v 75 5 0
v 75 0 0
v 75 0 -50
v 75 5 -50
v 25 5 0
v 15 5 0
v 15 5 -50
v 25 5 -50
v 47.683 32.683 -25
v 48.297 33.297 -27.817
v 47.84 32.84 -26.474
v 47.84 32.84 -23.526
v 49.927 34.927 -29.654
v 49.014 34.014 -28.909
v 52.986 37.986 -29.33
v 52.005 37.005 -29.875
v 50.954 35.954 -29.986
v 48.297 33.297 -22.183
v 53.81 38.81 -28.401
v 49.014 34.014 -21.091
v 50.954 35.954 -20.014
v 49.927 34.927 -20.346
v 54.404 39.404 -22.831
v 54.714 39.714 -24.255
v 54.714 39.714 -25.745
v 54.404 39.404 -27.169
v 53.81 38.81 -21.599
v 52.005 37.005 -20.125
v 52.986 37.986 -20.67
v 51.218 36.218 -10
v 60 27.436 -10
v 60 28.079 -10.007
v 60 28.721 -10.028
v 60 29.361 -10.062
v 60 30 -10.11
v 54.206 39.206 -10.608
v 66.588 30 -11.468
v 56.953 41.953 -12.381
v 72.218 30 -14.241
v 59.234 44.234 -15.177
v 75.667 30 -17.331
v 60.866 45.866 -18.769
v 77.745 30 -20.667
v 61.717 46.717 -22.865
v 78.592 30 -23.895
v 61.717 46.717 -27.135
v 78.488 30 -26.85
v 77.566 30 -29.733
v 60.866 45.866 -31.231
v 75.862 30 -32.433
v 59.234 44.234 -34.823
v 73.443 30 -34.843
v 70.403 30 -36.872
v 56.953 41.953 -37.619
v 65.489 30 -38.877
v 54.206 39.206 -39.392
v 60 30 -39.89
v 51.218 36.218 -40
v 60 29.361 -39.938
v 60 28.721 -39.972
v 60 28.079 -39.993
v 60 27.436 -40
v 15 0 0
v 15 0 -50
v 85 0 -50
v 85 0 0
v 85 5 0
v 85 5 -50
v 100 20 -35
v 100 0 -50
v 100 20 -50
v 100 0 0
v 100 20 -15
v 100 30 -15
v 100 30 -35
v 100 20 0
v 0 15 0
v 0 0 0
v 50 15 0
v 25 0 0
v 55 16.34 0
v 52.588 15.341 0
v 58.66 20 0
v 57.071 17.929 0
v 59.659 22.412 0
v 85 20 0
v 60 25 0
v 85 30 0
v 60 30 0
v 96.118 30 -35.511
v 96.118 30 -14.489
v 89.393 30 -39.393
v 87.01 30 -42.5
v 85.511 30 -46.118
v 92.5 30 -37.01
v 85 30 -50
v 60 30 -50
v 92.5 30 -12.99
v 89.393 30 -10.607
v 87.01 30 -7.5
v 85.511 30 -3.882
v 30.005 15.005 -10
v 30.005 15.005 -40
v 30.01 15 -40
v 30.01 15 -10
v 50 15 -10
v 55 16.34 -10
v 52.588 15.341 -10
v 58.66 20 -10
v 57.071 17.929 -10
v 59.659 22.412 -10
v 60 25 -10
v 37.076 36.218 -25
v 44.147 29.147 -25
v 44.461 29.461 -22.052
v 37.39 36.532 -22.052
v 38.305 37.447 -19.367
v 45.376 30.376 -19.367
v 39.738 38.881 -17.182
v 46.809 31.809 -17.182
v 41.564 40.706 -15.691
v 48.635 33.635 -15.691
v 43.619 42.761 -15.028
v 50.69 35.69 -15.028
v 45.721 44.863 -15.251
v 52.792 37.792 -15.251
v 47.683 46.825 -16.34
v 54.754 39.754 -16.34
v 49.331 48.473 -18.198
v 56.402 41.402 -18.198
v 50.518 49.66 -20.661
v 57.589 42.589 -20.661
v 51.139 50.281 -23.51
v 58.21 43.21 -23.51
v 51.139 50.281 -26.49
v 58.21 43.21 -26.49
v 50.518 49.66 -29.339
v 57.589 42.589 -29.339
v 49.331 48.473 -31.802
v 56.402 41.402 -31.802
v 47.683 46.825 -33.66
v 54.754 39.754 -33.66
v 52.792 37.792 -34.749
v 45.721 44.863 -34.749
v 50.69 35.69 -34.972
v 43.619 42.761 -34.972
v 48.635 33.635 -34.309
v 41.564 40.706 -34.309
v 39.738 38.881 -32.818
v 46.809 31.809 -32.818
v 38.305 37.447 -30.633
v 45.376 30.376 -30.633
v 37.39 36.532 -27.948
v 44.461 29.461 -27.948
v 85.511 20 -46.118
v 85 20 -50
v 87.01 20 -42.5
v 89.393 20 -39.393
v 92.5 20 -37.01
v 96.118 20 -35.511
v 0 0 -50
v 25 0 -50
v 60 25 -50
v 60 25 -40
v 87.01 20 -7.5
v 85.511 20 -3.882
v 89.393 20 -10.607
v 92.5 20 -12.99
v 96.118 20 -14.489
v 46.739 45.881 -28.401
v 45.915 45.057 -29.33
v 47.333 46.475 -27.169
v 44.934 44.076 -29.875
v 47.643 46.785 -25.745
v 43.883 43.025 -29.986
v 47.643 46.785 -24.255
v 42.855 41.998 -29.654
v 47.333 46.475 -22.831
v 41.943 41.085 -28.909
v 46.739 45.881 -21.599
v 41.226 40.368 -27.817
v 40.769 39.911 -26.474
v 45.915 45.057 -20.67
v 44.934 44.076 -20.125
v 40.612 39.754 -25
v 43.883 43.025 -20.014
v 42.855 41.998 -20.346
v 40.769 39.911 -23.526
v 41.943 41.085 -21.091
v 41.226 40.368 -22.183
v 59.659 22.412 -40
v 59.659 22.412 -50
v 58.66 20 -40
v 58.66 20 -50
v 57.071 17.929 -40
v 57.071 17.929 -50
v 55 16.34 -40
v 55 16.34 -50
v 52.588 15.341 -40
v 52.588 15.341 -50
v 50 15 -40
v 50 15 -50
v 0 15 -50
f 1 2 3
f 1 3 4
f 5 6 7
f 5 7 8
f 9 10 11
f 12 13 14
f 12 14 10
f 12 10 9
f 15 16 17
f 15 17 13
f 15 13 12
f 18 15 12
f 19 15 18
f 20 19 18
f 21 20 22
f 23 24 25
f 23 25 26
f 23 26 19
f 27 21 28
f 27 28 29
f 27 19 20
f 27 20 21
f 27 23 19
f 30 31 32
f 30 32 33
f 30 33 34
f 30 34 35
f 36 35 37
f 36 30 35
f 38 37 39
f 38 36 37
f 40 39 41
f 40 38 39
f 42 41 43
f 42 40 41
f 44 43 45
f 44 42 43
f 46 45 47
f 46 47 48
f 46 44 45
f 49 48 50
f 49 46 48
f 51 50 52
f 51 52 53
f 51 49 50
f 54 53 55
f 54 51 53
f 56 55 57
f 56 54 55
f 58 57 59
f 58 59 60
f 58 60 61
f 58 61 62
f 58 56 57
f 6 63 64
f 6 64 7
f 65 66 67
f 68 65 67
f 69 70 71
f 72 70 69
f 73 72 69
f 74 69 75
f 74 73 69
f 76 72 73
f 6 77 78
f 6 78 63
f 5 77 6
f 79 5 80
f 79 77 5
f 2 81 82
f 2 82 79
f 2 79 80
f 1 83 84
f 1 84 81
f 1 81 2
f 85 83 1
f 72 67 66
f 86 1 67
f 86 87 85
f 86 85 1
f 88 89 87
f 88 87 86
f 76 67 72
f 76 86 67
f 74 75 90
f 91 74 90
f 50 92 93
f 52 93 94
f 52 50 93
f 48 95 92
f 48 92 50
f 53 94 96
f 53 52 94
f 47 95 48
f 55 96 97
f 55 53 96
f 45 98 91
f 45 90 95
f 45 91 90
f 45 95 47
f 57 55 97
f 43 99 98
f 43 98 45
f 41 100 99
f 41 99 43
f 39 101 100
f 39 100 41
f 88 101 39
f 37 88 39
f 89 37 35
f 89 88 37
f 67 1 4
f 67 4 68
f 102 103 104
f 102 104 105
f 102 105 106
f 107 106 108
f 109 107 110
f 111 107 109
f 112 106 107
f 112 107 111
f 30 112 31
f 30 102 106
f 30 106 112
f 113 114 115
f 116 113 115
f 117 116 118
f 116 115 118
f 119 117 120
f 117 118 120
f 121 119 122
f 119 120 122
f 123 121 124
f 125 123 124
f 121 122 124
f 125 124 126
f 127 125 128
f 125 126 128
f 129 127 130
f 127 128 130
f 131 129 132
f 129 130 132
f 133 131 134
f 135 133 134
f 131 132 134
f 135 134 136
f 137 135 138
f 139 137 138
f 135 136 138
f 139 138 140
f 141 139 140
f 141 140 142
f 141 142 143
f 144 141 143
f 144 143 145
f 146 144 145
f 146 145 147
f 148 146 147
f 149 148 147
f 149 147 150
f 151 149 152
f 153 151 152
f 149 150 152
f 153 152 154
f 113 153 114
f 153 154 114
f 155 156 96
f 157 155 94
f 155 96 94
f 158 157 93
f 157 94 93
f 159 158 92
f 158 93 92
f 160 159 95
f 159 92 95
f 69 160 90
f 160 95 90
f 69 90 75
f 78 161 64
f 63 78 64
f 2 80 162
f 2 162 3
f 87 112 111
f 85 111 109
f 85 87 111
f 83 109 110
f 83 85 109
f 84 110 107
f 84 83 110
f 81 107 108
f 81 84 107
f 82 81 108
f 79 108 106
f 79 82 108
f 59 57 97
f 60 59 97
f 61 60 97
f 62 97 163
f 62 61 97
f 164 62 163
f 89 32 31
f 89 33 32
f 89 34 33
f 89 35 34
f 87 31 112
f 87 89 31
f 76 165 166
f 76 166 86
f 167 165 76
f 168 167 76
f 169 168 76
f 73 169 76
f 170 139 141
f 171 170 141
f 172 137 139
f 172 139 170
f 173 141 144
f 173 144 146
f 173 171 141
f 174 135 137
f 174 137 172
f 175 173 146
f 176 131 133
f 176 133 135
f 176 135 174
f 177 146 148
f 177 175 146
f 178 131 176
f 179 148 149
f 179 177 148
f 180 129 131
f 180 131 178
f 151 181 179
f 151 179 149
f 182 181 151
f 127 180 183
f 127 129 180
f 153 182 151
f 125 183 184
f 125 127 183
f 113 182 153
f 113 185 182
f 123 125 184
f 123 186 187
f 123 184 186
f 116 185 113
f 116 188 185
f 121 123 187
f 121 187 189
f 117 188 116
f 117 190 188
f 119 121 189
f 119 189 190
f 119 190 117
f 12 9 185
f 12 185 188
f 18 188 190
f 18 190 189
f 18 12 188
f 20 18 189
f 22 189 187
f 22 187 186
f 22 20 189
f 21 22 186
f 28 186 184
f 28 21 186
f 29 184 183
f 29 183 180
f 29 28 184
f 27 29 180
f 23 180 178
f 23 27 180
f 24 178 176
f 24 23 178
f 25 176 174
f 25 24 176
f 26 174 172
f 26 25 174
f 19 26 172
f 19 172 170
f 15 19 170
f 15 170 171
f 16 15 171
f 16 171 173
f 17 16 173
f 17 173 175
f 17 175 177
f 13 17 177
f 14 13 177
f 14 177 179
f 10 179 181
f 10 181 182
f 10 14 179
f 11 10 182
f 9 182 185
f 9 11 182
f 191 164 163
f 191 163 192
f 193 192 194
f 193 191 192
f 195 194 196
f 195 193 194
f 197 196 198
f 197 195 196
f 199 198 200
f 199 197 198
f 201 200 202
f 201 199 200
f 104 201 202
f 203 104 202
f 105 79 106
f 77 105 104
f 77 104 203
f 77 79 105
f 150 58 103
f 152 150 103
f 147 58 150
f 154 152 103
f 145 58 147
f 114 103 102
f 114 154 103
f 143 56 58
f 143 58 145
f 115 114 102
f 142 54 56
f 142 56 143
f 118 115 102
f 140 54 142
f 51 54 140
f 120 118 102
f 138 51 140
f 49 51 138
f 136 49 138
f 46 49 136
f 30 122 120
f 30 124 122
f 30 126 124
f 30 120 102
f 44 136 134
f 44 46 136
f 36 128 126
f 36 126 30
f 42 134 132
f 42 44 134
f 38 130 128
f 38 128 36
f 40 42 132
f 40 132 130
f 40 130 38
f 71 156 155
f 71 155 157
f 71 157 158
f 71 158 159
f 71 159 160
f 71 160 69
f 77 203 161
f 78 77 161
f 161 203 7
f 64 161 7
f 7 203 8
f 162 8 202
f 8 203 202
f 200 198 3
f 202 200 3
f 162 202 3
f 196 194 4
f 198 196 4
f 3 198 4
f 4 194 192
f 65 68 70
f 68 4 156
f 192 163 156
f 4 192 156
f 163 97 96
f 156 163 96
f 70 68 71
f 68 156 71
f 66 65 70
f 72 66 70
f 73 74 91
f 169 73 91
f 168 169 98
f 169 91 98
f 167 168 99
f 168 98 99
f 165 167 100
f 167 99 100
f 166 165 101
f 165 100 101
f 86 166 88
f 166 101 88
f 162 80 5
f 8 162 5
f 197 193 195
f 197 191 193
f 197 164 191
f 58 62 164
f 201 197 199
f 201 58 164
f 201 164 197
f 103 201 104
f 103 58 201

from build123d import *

# Parameters (mm, degrees)
BOSS_EXTRUDE1_DEPTH = 50
BOSS_EXTRUDE2_REACH = 113.636
SKETCH2_W           = 30
SKETCH2_H           = 14.135098559
SKETCH3_R           = 10
SKETCH3_R_2         = 5
BOSS_EXTRUDE3_DEPTH = 10
SKETCH4_R           = 15
CUT_EXTRUDE1_DEPTH  = 10
SKETCH5_W           = 10
SKETCH5_H           = 5
CUT_EXTRUDE2_DEPTH  = 123.622026278


with BuildPart() as part:
    # Sketch1 → Boss-Extrude1 (new body)
    with BuildSketch(Plane.XY):
        with BuildLine():
            Line((0, 0), (100, 0))
            Line((100, 0), (100, 30))
            Line((100, 30), (60, 30))
            Line((60, 30), (60, 25))
            ThreePointArc((60, 25), (57.071067812, 17.928932188), (50, 15))
            Line((50, 15), (0, 15))
            Line((0, 15), (0, 0))
        make_face()
    extrude(amount=-BOSS_EXTRUDE1_DEPTH)

    # Boss-Extrude2: up to this plane
    boss_extrude2_end = Plane(origin=(50, 15, -50), z_dir=(0, 1, 0))
    # Sketch2 → Boss-Extrude2 (add, up to the surface)
    with BuildSketch(Plane(origin=(7.5, -7.5, 0), x_dir=(0, 0, 1), z_dir=(-0.7071067811865489, 0.7071067811865462, 0)), mode=Mode.PRIVATE) as boss_extrude2_sk1:
        with Locations((-25, 38.894391498)):
            Rectangle(SKETCH2_W, SKETCH2_H)
    boss_extrude2_tool1 = split(extrude(boss_extrude2_sk1.sketch, amount=-BOSS_EXTRUDE2_REACH, mode=Mode.PRIVATE), bisect_by=boss_extrude2_end, keep=Keep.BOTH, mode=Mode.PRIVATE)
    add(boss_extrude2_tool1.solids().sort_by_distance((35.002488, 20.002488, -25))[0])
    # Sketch2 → Boss-Extrude2 (add, up to the surface)
    with BuildSketch(Plane(origin=(7.5, -7.5, 0), x_dir=(0, 0, 1), z_dir=(-0.7071067811865489, 0.7071067811865462, 0)), mode=Mode.PRIVATE) as boss_extrude2_sk2:
        with BuildLine():
            Line((-40, 61.826842218), (-40, 45.961940777))
            Line((-40, 45.961940777), (-10, 45.961940777))
            Line((-10, 45.961940777), (-10, 61.826842218))
            ThreePointArc((-10, 61.826842218), (-25, 76.826842218), (-40, 61.826842218))
        make_face()
    boss_extrude2_tool2 = split(extrude(boss_extrude2_sk2.sketch, amount=-BOSS_EXTRUDE2_REACH, mode=Mode.PRIVATE), bisect_by=boss_extrude2_end, keep=Keep.BOTH, mode=Mode.PRIVATE)
    add(boss_extrude2_tool2.solids().sort_by_distance((49.917636, 34.917636, -25))[0])

    # Sketch3 → Boss-Extrude3 (add)
    with BuildSketch(Plane(origin=(7.5, -7.5, 0), x_dir=(0, 0, 1), z_dir=(-0.7071067811865488, 0.7071067811865464, 0))):
        with Locations(Location((-25, 61.826842218, 0), (0, 0, 270))):
            Circle(SKETCH3_R)
        with Locations(Location((-25, 61.826842218, 0), (0, 0, 270))):
            Circle(SKETCH3_R_2, mode=Mode.SUBTRACT)
    extrude(amount=BOSS_EXTRUDE3_DEPTH)

    # Sketch4 → Cut-Extrude1 (cut)
    with BuildSketch(Plane(origin=(0, 30, 0), x_dir=(1, 0, 0), z_dir=(0, 1, 0))):
        with Locations((100, 50)):
            Circle(SKETCH4_R)
        with Locations((100, 0)):
            Circle(SKETCH4_R)
    extrude(amount=-CUT_EXTRUDE1_DEPTH, mode=Mode.SUBTRACT)

    # Sketch5 → Cut-Extrude2 (cut, through all)
    with BuildSketch(Plane.XY):
        with Locations((20, 2.5)):
            Rectangle(SKETCH5_W, SKETCH5_H)
        with Locations((80, 2.5)):
            Rectangle(SKETCH5_W, SKETCH5_H)
    extrude(amount=-CUT_EXTRUDE2_DEPTH, mode=Mode.SUBTRACT)


solid = part.part
